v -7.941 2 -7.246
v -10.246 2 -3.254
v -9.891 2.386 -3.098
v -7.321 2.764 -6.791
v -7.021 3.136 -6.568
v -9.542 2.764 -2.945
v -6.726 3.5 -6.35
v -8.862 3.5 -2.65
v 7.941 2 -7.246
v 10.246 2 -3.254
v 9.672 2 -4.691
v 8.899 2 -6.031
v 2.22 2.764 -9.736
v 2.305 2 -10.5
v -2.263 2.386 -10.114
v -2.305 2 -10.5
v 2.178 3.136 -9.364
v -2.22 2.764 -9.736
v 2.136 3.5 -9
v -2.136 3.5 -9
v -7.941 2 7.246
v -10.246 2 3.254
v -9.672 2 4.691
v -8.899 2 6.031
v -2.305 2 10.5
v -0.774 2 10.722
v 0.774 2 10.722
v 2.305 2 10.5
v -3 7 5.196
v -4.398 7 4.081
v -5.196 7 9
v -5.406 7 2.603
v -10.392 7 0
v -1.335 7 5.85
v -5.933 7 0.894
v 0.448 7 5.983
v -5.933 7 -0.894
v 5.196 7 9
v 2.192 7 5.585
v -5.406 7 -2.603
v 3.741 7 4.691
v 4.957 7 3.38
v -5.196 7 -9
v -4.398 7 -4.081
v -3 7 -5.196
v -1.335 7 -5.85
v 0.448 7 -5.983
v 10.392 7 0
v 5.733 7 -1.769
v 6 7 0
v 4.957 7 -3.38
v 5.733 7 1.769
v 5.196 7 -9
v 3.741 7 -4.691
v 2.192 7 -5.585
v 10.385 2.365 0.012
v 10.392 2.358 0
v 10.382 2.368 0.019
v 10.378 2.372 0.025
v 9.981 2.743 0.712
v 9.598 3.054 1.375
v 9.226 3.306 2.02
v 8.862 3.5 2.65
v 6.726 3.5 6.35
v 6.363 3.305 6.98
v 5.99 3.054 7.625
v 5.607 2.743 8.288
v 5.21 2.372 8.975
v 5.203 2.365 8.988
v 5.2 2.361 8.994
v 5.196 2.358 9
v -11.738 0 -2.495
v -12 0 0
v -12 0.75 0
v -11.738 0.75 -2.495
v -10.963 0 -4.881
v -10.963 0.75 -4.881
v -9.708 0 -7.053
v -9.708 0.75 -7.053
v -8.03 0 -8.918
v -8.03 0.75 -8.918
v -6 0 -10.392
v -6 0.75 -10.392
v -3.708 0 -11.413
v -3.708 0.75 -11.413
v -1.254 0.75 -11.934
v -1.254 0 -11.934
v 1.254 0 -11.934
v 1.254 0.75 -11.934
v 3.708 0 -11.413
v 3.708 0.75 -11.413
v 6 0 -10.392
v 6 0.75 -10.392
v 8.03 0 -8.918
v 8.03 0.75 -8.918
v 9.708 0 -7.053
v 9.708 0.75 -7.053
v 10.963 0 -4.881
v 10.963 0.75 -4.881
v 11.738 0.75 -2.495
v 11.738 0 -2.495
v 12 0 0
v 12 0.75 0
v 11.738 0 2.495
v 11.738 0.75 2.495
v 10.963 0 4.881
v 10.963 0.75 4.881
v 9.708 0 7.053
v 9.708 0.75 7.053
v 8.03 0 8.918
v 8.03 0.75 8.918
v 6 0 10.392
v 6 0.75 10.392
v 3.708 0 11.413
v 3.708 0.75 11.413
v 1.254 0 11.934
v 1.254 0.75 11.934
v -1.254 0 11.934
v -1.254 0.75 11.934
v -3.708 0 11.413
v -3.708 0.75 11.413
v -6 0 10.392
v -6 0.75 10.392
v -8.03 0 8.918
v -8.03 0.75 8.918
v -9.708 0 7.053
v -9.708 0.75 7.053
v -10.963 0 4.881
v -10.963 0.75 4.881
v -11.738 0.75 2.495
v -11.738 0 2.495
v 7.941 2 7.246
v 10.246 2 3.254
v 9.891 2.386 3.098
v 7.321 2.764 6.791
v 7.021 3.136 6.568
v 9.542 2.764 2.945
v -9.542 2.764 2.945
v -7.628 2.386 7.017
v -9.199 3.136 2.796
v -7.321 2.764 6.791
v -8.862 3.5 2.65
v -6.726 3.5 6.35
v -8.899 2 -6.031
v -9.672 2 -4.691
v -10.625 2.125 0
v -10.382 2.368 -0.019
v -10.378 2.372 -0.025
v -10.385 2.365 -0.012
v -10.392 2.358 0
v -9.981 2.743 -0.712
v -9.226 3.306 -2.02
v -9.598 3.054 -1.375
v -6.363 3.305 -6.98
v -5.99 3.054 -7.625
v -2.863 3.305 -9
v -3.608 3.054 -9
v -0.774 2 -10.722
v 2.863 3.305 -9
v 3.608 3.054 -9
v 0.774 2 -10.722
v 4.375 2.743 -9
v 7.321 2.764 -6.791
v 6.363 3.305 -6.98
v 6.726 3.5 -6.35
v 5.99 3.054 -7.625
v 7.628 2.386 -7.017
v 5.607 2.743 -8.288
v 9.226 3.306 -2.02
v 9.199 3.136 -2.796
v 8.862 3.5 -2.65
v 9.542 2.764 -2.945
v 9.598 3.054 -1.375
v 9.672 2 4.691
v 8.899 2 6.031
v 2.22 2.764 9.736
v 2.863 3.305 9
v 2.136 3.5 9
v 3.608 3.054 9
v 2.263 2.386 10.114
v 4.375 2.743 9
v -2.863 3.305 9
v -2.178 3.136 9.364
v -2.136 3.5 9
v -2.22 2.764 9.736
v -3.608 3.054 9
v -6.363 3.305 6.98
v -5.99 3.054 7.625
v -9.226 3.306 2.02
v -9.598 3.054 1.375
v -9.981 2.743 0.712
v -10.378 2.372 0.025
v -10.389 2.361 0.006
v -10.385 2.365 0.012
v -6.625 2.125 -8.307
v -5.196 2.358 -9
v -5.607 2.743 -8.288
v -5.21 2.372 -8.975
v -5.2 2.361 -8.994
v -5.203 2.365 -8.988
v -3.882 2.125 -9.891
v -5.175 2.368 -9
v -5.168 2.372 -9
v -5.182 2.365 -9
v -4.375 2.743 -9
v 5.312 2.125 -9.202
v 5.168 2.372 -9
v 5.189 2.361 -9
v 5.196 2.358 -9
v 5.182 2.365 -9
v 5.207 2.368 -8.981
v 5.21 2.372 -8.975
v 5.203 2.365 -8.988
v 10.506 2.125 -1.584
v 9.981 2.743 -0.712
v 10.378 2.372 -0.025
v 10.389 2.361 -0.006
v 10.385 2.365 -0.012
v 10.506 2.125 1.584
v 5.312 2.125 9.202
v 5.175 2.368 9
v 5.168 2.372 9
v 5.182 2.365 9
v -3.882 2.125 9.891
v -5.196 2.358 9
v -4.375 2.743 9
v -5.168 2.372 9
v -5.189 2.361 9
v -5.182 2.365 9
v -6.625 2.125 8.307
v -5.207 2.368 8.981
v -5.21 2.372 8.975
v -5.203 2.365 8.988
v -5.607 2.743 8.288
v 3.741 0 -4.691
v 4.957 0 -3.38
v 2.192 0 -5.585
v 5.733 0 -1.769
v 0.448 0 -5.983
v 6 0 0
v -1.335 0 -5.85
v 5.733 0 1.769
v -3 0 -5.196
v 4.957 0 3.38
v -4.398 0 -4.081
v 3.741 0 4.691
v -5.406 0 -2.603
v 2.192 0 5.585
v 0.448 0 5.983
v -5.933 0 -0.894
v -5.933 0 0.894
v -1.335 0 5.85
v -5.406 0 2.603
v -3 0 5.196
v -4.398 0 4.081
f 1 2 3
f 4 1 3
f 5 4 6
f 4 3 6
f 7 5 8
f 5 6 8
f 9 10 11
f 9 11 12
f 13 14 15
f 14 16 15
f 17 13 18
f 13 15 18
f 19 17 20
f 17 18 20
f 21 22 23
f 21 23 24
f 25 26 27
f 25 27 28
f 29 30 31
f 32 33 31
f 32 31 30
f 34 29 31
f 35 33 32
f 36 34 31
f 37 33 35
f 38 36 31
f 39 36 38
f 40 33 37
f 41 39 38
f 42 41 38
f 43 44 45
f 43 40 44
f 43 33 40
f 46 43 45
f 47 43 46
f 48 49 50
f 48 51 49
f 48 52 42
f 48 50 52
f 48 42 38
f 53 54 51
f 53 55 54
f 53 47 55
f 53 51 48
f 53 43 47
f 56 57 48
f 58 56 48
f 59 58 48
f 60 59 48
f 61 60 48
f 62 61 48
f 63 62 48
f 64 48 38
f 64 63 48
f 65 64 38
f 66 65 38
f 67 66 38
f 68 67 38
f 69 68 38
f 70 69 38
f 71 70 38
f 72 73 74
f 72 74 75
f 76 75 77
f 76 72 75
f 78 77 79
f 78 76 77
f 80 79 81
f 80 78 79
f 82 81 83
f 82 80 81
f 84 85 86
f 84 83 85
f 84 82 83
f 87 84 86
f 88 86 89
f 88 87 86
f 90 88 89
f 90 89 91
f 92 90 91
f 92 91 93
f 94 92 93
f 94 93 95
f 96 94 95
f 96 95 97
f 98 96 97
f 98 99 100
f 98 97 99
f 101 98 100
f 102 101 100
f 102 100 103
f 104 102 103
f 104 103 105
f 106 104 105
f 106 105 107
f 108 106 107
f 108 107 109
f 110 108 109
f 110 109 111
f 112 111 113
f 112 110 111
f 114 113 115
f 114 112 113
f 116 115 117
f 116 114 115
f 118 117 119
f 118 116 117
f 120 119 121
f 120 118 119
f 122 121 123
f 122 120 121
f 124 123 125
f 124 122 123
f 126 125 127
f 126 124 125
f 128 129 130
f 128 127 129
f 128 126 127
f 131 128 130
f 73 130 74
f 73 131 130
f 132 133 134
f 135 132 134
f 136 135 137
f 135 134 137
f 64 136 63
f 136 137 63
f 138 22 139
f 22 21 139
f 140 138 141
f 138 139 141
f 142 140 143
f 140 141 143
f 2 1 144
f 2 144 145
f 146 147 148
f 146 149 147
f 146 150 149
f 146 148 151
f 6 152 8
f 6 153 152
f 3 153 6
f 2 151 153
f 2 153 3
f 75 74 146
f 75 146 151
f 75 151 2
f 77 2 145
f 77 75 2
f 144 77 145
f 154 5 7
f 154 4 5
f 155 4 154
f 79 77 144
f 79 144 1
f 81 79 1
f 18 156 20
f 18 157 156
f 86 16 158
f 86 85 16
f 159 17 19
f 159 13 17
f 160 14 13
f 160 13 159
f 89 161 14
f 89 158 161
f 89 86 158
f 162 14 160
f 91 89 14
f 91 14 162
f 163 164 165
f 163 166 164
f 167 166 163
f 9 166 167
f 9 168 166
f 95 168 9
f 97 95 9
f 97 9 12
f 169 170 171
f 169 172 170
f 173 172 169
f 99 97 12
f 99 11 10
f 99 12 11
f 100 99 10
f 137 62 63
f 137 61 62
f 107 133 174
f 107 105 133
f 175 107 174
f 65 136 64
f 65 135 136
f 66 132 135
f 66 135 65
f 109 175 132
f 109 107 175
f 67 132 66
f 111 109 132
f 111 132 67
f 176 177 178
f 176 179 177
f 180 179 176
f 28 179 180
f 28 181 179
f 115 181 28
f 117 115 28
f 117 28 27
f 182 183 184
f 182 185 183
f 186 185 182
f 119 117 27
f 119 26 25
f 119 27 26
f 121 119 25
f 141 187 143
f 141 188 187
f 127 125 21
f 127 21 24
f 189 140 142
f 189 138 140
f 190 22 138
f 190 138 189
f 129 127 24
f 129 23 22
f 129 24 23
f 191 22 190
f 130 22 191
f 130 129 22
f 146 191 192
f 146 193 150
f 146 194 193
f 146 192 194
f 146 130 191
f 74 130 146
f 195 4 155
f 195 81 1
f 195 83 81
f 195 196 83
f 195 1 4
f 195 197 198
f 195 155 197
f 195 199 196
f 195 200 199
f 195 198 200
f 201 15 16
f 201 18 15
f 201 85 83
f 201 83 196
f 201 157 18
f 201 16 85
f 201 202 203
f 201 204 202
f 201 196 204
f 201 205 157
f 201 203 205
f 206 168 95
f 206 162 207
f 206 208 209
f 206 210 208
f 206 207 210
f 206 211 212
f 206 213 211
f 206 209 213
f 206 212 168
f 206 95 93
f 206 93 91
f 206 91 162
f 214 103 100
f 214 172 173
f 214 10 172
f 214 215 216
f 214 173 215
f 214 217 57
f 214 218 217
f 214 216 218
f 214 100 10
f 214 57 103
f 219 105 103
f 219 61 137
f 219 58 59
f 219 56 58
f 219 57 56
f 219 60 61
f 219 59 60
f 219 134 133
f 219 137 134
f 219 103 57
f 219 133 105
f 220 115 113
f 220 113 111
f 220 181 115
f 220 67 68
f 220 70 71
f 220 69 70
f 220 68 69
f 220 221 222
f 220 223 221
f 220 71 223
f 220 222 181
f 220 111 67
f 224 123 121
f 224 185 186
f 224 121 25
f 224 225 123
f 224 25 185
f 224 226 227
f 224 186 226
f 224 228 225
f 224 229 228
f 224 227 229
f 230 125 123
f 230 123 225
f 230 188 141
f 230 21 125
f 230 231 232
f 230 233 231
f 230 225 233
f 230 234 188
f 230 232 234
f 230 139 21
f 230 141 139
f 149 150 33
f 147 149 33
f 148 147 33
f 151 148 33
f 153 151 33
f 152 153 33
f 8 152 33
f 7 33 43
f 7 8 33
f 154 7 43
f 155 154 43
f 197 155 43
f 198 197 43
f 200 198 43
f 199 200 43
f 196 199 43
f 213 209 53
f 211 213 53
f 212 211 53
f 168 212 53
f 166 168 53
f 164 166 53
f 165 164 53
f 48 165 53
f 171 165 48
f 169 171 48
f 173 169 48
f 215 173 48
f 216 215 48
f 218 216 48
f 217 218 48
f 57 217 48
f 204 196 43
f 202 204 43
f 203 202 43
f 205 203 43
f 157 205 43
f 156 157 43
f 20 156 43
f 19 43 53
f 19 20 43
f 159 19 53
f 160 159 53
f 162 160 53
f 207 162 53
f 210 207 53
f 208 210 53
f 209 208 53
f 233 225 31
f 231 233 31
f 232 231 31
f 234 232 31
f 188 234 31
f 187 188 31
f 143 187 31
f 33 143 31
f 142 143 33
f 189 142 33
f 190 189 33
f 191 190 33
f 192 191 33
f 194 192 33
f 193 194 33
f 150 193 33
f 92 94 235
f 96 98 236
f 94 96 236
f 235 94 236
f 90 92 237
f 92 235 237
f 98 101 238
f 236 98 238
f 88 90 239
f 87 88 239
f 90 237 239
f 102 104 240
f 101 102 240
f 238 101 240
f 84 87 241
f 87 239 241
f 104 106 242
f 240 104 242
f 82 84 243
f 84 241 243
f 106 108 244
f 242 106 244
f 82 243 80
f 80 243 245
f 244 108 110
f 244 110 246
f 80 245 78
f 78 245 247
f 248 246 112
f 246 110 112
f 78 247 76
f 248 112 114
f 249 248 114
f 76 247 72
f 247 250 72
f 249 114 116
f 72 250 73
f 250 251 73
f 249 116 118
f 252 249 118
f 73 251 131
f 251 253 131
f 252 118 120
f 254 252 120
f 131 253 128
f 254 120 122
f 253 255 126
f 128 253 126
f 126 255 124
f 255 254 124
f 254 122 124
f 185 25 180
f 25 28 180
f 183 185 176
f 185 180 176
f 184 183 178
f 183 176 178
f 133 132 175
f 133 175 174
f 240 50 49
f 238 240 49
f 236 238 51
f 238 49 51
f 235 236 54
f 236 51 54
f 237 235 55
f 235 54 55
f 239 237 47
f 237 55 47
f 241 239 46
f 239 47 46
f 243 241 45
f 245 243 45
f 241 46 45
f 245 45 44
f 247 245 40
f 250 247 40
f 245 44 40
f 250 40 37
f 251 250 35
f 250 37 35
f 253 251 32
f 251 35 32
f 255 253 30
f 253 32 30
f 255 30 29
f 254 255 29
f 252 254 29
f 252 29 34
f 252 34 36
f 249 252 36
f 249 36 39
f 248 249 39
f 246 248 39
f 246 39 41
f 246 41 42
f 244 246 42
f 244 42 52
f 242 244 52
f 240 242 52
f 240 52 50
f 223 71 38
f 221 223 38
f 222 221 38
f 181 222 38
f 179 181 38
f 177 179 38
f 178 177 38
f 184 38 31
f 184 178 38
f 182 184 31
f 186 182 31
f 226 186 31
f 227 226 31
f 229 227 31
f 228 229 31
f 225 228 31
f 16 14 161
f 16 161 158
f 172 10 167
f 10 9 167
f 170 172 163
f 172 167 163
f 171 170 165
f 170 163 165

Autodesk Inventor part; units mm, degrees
ref_plane "YZ Plane" through (0, 0, 0) normal (1, 0, 0) x (0, 1, 0)
ref_plane "XZ Plane" through (0, 0, 0) normal (0, 1, 0) x (-1, 0, 0)
ref_plane "XY Plane" through (0, 0, 0) normal (0, 0, 1) x (1, 0, 0)
sketch "Sketch2" plane through (0, 0, 0) normal (0, 1, 0) x (-1, 0, 0)
  circle A0 centre (0, 0) radius 12
  dimension "d3" = 24
extrude "Extrusion1" add sketch "Sketch2" along normal blind 2
sketch "Sketch3" plane through (0, 2, 0) normal (0, 1, 0) x (1, 0, 0)
  line L0 (5.1962, 9) -> (10.3923, 0)
  line L1 (10.3923, 0) -> (5.1962, -9)
  line L2 (5.1962, -9) -> (-5.1962, -9)
  line L3 (-5.1962, -9) -> (-10.3923, 0)
  line L4 (-10.3923, 0) -> (-5.1962, 9)
  line L5 (-5.1962, 9) -> (5.1962, 9)
  point P0 (0, 0)
  point P1 (0, 0)
  dimension "d2" = 18
extrude "Extrusion2" add sketch "Sketch3" along normal blind 5
chamfer "Chamfer1" distance 1.25 angle 45 1 edges at (12, 2, 0)
sketch "Sketch4" plane through (0, 7, 0) normal (0, 1, 0) x (1, 0, 0)
  circle A0 centre (0, 0) radius 6
  dimension "d9" = 12
extrude "Extrusion3" cut sketch "Sketch4" against normal through all
chamfer "Chamfer2" distance 1.5 angle 45 6 edges at (7.7942, 2, 4.5) (7.7942, 2, -4.5) (0, 2, -9) (-7.7942, 2, -4.5) (0, 2, 9) (-7.7942, 2, 4.5)
thread "Thread1" size "M12x1.75" class "6H" standard "ISO Metric profile" full length
properties part number "Nylon Nut"
